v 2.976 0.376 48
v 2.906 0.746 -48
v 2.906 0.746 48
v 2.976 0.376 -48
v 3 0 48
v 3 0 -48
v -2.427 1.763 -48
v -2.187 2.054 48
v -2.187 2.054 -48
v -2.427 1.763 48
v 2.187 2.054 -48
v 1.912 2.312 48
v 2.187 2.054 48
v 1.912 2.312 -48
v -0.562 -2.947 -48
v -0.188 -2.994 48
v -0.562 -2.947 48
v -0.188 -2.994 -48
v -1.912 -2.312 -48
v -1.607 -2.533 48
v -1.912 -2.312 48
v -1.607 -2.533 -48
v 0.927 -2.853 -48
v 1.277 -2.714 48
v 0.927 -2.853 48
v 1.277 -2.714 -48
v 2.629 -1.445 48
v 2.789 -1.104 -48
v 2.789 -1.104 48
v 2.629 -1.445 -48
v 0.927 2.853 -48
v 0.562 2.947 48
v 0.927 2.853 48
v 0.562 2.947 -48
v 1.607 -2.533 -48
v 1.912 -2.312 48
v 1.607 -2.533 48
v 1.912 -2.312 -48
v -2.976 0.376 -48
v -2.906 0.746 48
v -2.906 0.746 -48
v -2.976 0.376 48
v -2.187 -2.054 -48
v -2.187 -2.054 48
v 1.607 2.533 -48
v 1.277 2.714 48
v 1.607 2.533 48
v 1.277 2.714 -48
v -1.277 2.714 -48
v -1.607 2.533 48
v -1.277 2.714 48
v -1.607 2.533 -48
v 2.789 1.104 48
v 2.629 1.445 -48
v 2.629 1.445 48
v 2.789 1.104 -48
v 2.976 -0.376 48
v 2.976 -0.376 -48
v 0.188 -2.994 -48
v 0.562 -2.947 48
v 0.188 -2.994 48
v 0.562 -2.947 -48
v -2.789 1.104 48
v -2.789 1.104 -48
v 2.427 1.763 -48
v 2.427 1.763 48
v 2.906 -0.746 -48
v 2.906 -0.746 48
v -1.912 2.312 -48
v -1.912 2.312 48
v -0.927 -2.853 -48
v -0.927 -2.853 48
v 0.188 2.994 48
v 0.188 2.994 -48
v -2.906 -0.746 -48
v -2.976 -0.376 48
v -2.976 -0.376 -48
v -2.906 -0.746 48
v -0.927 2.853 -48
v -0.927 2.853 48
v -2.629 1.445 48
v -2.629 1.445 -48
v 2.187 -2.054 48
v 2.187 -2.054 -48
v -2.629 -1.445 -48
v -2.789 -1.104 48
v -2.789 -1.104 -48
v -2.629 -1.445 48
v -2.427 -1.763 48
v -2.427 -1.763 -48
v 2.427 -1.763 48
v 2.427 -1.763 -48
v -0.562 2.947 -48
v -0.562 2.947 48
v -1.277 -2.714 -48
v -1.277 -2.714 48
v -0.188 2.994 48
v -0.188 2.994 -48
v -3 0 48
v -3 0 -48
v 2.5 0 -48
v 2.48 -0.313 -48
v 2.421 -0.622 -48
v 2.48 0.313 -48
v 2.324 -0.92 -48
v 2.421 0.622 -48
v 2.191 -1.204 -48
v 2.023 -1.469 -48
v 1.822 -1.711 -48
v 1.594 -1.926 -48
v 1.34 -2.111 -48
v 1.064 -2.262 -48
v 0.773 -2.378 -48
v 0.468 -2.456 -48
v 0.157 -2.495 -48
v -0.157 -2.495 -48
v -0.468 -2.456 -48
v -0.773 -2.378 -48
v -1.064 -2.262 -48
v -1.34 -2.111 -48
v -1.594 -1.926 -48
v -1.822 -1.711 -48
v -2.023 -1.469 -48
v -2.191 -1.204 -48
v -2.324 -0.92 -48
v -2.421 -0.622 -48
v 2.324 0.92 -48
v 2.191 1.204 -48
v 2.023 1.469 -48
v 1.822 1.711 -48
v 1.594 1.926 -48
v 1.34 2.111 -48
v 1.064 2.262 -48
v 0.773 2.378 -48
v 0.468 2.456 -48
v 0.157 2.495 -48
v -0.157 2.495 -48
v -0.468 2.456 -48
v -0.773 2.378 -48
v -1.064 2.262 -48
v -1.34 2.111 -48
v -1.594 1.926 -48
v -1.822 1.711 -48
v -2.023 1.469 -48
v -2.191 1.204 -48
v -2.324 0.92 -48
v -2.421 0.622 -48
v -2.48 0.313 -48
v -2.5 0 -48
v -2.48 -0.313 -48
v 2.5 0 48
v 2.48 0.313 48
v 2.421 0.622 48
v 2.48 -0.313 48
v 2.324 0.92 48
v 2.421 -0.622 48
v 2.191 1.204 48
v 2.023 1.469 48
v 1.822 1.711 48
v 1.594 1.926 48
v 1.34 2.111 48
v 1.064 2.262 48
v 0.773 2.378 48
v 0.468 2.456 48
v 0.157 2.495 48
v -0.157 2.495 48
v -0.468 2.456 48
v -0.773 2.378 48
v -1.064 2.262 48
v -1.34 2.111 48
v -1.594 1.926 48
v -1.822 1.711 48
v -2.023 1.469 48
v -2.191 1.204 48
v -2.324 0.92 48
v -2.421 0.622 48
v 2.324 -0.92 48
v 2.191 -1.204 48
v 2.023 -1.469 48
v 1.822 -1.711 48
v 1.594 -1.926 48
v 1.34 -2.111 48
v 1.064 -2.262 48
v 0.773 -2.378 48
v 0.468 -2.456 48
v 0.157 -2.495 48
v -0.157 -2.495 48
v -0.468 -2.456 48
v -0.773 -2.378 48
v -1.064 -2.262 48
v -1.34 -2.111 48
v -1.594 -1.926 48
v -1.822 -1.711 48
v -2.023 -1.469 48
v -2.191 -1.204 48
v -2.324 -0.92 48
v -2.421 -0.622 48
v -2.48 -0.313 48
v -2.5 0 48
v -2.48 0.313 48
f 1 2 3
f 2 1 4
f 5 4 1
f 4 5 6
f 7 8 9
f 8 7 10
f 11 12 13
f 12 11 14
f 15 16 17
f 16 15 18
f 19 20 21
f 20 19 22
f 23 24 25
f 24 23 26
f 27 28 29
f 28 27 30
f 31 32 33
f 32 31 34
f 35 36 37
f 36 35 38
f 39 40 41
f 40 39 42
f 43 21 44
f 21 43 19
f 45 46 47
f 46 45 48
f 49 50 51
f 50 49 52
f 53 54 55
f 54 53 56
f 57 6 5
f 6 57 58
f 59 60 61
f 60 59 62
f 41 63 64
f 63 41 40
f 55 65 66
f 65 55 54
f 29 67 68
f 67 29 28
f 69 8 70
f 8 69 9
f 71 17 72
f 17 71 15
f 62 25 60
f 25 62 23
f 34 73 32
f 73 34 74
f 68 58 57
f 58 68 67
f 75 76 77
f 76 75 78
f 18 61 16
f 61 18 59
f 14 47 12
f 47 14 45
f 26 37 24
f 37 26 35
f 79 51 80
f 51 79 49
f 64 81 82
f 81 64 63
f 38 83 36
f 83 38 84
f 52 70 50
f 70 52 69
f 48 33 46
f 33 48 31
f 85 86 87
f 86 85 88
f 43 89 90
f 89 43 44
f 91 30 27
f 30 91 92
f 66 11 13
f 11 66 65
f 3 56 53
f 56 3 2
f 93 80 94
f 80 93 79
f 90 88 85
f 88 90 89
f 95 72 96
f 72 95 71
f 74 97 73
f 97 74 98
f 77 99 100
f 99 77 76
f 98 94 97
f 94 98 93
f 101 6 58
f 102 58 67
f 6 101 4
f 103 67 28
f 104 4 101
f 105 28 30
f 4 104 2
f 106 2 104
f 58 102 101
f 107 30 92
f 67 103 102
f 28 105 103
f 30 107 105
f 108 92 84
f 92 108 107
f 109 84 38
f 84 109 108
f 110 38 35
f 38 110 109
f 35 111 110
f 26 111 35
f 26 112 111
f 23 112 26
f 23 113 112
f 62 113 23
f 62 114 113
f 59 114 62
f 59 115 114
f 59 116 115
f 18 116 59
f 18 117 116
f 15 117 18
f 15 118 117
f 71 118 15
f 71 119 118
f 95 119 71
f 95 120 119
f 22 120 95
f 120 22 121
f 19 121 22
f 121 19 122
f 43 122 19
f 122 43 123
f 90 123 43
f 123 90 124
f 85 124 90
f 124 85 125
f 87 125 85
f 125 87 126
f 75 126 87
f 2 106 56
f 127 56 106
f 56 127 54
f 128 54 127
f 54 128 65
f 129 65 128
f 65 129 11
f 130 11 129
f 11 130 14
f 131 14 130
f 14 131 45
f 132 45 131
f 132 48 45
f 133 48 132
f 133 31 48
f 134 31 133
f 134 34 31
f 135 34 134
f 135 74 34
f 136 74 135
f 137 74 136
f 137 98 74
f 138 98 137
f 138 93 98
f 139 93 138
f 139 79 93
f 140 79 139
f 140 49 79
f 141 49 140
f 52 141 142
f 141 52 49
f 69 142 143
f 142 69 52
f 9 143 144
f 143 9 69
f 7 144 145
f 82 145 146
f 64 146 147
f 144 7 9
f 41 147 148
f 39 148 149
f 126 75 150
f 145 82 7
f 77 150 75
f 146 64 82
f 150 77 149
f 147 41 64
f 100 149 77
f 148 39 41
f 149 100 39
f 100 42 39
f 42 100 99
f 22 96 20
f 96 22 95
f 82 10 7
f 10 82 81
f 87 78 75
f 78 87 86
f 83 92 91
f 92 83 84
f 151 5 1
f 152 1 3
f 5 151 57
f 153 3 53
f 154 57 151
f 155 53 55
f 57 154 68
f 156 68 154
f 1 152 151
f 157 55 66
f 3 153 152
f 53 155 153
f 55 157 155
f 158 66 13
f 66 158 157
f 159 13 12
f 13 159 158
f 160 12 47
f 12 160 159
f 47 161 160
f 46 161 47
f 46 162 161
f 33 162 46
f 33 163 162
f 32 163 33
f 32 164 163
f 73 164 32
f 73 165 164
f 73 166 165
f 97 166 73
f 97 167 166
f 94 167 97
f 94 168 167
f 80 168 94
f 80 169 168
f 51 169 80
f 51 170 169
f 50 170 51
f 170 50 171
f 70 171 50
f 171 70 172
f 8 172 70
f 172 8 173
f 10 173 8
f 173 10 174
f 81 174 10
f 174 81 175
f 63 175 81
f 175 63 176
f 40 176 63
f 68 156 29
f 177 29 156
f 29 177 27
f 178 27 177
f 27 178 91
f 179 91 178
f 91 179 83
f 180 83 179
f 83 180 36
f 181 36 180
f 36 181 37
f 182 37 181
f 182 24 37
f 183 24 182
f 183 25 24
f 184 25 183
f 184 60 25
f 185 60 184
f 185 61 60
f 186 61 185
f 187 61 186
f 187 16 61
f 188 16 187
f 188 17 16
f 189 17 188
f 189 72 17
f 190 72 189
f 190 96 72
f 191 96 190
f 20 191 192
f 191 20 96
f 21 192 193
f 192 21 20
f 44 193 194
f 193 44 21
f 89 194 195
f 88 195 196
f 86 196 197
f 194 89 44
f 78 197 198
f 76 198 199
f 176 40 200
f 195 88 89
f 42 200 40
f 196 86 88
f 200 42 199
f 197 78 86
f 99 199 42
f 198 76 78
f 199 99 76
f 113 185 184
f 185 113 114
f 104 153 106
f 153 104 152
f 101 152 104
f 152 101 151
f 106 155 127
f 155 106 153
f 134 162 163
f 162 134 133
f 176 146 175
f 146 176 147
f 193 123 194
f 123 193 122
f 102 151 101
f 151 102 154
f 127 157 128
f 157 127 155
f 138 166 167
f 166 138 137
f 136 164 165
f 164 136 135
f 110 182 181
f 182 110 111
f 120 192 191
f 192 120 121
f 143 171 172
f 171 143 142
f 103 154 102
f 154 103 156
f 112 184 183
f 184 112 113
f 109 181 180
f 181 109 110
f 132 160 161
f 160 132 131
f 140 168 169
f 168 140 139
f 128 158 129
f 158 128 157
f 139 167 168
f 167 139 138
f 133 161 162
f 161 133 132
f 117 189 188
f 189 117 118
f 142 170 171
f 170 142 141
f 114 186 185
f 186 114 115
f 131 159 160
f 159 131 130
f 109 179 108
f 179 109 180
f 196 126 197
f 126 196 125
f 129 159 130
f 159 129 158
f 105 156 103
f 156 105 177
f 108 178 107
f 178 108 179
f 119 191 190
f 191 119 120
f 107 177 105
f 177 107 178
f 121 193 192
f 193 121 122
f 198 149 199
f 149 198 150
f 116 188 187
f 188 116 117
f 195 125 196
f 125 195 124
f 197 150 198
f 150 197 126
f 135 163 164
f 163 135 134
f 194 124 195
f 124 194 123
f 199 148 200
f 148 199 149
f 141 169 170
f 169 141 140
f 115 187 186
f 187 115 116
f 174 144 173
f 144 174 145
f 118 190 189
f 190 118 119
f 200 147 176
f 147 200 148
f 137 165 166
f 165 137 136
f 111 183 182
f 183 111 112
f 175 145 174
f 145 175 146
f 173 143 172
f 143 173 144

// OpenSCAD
$fn = 50;


difference() {
	union() {
		translate(v = [0, 0, -48.0000000000]) {
			cylinder(h = 96, r = 3.0000000000);
		}
	}
	union() {
		translate(v = [0, 0, -100.0000000000]) {
			cylinder(h = 200, r = 2.5000000000);
		}
	}
}
